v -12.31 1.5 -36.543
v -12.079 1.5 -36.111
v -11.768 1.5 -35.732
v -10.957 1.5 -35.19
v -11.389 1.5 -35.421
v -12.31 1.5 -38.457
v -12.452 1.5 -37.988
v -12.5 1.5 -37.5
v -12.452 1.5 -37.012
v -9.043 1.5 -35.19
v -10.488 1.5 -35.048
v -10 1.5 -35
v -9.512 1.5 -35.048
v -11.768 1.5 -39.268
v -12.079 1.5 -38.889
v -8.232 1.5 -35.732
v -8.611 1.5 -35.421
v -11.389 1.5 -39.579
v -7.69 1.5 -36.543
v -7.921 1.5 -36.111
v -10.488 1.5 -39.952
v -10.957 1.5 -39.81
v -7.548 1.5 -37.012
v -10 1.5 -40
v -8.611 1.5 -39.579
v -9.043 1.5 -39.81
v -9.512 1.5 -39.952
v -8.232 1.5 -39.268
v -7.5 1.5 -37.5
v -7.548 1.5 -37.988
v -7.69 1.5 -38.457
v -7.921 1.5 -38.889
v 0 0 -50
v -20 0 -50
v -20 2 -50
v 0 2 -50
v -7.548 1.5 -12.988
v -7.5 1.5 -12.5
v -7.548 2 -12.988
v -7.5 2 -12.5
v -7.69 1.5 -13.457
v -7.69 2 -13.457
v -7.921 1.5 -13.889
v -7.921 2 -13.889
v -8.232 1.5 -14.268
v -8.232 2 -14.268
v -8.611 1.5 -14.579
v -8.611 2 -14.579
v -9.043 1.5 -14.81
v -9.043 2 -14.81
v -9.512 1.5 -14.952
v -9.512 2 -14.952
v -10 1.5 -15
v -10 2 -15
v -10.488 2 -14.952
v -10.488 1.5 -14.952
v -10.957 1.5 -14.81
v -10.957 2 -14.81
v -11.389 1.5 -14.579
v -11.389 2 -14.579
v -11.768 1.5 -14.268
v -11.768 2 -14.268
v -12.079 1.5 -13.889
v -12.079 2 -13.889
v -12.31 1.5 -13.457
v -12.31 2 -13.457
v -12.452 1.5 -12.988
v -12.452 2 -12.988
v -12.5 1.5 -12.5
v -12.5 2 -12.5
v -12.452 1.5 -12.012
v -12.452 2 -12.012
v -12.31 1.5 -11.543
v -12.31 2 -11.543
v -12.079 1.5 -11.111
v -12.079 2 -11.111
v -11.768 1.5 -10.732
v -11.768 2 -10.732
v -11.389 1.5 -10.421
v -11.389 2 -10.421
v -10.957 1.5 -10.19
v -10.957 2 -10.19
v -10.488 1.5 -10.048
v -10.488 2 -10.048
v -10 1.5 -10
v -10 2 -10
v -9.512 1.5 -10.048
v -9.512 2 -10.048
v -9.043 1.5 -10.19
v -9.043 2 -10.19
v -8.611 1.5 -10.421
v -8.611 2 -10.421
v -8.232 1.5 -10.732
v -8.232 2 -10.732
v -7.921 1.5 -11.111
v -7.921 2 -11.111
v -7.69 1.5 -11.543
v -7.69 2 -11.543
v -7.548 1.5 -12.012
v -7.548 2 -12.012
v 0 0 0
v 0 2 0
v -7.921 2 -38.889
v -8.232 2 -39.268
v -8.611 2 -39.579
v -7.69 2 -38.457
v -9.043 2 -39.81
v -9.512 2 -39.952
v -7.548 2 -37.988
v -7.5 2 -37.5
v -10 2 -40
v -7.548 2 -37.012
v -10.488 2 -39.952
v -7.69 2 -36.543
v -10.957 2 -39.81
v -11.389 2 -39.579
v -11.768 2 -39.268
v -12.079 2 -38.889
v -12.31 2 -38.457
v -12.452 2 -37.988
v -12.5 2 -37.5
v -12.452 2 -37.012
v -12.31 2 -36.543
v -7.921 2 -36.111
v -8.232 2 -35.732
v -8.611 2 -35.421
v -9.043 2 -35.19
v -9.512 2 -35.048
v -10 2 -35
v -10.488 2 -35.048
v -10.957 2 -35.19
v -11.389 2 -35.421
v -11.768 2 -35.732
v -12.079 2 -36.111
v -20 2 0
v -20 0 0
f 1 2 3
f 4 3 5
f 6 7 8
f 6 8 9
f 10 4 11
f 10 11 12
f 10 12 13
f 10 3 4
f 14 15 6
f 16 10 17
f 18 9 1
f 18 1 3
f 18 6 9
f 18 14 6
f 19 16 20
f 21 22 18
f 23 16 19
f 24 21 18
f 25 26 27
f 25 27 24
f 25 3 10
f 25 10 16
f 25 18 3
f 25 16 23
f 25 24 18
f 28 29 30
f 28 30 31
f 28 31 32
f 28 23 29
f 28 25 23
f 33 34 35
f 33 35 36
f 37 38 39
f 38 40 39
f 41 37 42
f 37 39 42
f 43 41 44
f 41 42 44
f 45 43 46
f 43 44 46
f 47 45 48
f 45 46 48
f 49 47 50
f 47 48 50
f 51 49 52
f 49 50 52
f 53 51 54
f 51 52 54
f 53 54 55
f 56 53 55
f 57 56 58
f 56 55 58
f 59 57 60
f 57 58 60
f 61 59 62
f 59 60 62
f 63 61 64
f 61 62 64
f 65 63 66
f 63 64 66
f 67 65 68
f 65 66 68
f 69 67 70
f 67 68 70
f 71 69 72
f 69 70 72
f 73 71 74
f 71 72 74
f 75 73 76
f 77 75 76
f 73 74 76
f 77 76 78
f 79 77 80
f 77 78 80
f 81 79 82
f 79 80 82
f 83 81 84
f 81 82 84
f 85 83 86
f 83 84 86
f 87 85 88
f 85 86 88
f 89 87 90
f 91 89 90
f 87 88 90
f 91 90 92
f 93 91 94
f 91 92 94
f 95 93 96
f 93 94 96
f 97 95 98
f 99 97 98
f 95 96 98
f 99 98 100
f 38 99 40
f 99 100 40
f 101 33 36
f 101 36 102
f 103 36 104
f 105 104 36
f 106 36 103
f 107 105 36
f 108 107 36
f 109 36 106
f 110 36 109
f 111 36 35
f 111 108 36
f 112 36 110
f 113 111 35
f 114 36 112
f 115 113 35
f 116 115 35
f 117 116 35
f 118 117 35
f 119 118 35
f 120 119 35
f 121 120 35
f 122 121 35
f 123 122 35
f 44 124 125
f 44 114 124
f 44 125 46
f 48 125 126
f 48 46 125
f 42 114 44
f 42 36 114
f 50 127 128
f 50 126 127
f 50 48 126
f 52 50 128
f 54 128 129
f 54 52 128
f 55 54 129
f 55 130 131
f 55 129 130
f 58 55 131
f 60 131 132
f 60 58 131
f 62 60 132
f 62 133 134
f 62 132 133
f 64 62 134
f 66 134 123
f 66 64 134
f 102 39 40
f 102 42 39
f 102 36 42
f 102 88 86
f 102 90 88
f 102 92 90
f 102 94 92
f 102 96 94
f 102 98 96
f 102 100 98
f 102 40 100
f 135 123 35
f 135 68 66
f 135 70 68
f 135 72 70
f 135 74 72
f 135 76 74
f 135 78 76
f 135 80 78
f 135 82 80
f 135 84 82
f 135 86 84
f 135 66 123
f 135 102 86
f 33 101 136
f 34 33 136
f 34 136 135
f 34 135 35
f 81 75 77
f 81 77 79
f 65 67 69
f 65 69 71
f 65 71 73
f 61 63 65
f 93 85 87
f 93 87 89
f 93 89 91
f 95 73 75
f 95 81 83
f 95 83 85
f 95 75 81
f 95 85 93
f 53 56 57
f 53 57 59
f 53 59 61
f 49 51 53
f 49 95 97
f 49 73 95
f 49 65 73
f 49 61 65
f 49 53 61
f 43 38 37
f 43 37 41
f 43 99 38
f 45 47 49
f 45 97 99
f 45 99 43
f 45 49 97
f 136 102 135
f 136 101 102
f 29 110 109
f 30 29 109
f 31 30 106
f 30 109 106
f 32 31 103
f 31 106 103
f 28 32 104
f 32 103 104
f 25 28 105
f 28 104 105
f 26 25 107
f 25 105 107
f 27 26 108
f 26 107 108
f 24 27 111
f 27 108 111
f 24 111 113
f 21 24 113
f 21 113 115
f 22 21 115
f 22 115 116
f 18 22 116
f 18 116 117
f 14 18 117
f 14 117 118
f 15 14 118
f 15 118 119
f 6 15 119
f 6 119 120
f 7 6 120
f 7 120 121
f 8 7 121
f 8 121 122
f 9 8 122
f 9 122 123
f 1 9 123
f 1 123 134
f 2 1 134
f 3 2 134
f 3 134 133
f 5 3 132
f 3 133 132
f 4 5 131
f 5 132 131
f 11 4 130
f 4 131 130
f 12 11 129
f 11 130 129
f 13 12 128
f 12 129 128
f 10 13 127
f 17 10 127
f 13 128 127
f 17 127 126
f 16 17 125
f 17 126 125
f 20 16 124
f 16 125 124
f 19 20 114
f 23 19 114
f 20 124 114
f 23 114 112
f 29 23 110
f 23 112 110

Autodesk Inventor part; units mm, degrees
ref_plane "YZ Plane" through (0, 0, 0) normal (1, 0, 0) x (0, 1, 0)
ref_plane "XZ Plane" through (0, 0, 0) normal (0, 1, 0) x (-1, 0, 0)
ref_plane "XY Plane" through (0, 0, 0) normal (0, 0, 1) x (1, 0, 0)
sketch "Sketch1" plane through (0, 0, 0) normal (0, 1, 0) x (-1, 0, 0)
  line L0 (0, 0) -> (20, 0)
  line L1 (20, 0) -> (20, -50)
  line L2 (20, -50) -> (0, -50)
  line L3 (0, -50) -> (0, 0)
  dimension "d0" = 20
  dimension "d1" = 50
extrude "Extrusion1" add sketch "Sketch1" along normal blind 2
sketch "Sketch2" plane through (0, 2, 0) normal (0, 1, 0) x (1, 0, 0)
  line L0 (-20, 0) -> (0, 0) projected
  line L1 (-10, 0) -> (-10, 50) construction
  line L2 (0, 50) -> (-20, 50) projected
  line L3 (-10, 0) -> (-10, 25) construction
  line L4 (-10, 25) -> (-10, 50) construction
  circle A0 centre (-10, 12.5) radius 2.5
  circle A1 centre (-10, 37.5) radius 2.5
  dimension "d4" = 5
  dimension "d5" = 5
extrude "Extrusion2" cut sketch "Sketch2" against normal blind 0.5
properties part number "PortaHerramienta2"
